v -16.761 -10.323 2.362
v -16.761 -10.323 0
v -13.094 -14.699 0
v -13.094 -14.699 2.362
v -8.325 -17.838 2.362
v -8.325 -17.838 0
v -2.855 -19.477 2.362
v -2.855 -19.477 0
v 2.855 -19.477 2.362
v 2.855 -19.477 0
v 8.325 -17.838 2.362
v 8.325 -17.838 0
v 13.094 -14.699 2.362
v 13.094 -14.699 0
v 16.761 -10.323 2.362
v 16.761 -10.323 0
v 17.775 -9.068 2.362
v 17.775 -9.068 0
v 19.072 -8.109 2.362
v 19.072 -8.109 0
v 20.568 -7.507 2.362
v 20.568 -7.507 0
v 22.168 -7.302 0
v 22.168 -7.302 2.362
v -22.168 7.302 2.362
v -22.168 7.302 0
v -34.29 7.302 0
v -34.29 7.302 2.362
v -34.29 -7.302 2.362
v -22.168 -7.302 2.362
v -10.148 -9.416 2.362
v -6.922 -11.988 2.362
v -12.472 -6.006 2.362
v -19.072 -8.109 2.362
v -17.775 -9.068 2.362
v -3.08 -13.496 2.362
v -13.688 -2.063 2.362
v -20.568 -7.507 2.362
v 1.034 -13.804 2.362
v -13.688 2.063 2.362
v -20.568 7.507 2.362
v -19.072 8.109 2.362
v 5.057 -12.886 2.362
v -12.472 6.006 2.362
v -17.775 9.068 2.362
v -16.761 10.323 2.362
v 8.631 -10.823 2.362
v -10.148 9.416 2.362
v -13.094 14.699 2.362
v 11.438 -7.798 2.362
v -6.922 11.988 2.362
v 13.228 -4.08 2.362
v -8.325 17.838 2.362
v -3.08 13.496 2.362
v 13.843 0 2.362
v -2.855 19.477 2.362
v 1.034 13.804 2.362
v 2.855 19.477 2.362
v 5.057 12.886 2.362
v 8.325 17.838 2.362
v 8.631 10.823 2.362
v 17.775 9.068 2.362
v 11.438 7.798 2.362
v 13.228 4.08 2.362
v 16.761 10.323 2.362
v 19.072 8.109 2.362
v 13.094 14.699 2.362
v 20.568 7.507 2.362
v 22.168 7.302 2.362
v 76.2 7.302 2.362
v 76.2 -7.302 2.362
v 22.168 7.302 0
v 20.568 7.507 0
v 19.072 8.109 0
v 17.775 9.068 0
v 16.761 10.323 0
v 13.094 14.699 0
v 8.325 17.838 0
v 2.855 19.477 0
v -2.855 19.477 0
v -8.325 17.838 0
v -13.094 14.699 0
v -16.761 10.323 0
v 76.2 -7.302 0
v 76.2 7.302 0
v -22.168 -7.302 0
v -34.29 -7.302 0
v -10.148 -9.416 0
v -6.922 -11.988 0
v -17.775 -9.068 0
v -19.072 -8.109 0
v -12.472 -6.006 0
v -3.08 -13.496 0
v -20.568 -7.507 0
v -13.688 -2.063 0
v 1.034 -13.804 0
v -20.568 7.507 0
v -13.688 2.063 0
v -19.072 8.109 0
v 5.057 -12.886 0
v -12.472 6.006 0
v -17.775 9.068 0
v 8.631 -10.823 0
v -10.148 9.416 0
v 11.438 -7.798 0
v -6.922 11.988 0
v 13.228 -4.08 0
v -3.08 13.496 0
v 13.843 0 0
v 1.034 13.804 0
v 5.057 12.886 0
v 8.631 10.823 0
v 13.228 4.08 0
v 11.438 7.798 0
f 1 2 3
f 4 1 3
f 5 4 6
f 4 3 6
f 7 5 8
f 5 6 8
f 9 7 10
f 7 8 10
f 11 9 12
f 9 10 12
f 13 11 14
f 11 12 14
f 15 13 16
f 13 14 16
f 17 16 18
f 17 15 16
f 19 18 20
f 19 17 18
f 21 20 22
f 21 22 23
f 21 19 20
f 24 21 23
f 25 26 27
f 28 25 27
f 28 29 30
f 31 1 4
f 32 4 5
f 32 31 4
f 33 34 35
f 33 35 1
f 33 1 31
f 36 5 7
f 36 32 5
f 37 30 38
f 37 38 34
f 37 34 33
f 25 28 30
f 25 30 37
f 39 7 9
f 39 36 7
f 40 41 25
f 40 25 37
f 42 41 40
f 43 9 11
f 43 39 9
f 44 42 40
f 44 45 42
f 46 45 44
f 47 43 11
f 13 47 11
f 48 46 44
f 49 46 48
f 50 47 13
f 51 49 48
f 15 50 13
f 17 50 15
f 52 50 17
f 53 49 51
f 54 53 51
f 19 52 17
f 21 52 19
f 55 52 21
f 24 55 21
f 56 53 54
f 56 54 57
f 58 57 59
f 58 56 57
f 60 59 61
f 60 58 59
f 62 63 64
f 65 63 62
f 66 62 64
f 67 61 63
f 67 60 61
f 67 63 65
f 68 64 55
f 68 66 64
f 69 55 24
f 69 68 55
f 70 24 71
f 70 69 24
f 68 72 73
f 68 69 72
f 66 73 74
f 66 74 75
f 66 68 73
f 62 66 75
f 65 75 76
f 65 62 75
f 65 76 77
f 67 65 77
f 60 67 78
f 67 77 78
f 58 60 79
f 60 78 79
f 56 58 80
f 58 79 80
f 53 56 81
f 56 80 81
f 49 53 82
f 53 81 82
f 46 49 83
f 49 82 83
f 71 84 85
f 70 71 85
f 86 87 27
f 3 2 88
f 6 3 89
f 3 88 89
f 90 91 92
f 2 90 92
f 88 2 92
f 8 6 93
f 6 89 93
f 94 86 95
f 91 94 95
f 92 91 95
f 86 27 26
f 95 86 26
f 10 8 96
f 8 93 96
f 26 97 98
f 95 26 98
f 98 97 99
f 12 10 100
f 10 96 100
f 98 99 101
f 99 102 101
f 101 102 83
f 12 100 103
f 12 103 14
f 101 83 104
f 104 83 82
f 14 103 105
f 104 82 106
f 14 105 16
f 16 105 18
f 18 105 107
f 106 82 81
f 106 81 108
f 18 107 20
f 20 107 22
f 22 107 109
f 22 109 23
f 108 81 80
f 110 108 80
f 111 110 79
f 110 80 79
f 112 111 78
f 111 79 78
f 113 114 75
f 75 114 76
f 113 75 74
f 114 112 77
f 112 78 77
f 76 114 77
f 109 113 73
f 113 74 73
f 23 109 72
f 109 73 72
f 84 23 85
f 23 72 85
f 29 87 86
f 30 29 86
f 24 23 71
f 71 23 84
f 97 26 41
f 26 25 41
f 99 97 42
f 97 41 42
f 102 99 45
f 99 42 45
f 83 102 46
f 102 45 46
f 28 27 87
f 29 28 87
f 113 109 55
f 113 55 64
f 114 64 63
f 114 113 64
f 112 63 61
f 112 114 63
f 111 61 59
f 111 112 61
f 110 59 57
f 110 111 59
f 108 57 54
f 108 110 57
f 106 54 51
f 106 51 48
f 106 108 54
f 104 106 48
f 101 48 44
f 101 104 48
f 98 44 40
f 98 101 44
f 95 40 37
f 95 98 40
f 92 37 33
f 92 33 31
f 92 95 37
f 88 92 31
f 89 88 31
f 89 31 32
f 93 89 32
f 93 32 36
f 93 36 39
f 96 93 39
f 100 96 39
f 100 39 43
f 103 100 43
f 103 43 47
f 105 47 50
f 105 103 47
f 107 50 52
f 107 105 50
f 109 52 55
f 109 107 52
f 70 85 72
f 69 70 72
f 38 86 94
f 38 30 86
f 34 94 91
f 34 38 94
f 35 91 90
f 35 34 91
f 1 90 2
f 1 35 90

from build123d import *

# Parameters (mm, degrees)
F0_R     = 13.843
F1_DEPTH = 2.3622
F2_R     = 6.35


with BuildPart() as f1:
    # F0 (on Top) → F1 (new body)
    with BuildSketch(Plane.XY):
        with BuildLine():
            ThreePointArc((-18.280392, -7.3025), (-19.685, 0), (-18.280392, 7.3025))
            Line((-18.280392, 7.3025), (-34.29, 7.3025))
            Line((-34.29, 7.3025), (-34.29, -7.3025))
            Line((-34.29, -7.3025), (-18.280392, -7.3025))
        make_face()
        with BuildLine():
            ThreePointArc((18.280392, -7.3025), (19.330659, -3.718179), (19.685, 0))
            ThreePointArc((19.685, 0), (19.330659, 3.718179), (18.280392, 7.3025))
            ThreePointArc((18.280392, 7.3025), (0, 19.685), (-18.280392, 7.3025))
            ThreePointArc((-18.280392, 7.3025), (-19.685, 0), (-18.280392, -7.3025))
            ThreePointArc((-18.280392, -7.3025), (0, -19.685), (18.280392, -7.3025))
        make_face()
        Circle(F0_R, mode=Mode.SUBTRACT)
        with BuildLine():
            ThreePointArc((18.280392, 7.3025), (19.330659, 3.718179), (19.685, 0))
            ThreePointArc((19.685, 0), (19.330659, -3.718179), (18.280392, -7.3025))
            Line((18.280392, -7.3025), (76.2, -7.3025))
            Line((76.2, -7.3025), (76.2, 7.3025))
            Line((76.2, 7.3025), (18.280392, 7.3025))
        make_face()
    extrude(amount=F1_DEPTH)

    # F2
    f2_edges = [f1.edges().sort_by_distance(p)[0] for p in [
        (18.280392, -7.3025, 1.1811),
        (-18.280392, -7.3025, 1.1811),
        (-18.280392, 7.3025, 1.1811),
        (18.280392, 7.3025, 1.1811),
    ]]
    fillet(f2_edges, radius=F2_R)


solid = f1.part
